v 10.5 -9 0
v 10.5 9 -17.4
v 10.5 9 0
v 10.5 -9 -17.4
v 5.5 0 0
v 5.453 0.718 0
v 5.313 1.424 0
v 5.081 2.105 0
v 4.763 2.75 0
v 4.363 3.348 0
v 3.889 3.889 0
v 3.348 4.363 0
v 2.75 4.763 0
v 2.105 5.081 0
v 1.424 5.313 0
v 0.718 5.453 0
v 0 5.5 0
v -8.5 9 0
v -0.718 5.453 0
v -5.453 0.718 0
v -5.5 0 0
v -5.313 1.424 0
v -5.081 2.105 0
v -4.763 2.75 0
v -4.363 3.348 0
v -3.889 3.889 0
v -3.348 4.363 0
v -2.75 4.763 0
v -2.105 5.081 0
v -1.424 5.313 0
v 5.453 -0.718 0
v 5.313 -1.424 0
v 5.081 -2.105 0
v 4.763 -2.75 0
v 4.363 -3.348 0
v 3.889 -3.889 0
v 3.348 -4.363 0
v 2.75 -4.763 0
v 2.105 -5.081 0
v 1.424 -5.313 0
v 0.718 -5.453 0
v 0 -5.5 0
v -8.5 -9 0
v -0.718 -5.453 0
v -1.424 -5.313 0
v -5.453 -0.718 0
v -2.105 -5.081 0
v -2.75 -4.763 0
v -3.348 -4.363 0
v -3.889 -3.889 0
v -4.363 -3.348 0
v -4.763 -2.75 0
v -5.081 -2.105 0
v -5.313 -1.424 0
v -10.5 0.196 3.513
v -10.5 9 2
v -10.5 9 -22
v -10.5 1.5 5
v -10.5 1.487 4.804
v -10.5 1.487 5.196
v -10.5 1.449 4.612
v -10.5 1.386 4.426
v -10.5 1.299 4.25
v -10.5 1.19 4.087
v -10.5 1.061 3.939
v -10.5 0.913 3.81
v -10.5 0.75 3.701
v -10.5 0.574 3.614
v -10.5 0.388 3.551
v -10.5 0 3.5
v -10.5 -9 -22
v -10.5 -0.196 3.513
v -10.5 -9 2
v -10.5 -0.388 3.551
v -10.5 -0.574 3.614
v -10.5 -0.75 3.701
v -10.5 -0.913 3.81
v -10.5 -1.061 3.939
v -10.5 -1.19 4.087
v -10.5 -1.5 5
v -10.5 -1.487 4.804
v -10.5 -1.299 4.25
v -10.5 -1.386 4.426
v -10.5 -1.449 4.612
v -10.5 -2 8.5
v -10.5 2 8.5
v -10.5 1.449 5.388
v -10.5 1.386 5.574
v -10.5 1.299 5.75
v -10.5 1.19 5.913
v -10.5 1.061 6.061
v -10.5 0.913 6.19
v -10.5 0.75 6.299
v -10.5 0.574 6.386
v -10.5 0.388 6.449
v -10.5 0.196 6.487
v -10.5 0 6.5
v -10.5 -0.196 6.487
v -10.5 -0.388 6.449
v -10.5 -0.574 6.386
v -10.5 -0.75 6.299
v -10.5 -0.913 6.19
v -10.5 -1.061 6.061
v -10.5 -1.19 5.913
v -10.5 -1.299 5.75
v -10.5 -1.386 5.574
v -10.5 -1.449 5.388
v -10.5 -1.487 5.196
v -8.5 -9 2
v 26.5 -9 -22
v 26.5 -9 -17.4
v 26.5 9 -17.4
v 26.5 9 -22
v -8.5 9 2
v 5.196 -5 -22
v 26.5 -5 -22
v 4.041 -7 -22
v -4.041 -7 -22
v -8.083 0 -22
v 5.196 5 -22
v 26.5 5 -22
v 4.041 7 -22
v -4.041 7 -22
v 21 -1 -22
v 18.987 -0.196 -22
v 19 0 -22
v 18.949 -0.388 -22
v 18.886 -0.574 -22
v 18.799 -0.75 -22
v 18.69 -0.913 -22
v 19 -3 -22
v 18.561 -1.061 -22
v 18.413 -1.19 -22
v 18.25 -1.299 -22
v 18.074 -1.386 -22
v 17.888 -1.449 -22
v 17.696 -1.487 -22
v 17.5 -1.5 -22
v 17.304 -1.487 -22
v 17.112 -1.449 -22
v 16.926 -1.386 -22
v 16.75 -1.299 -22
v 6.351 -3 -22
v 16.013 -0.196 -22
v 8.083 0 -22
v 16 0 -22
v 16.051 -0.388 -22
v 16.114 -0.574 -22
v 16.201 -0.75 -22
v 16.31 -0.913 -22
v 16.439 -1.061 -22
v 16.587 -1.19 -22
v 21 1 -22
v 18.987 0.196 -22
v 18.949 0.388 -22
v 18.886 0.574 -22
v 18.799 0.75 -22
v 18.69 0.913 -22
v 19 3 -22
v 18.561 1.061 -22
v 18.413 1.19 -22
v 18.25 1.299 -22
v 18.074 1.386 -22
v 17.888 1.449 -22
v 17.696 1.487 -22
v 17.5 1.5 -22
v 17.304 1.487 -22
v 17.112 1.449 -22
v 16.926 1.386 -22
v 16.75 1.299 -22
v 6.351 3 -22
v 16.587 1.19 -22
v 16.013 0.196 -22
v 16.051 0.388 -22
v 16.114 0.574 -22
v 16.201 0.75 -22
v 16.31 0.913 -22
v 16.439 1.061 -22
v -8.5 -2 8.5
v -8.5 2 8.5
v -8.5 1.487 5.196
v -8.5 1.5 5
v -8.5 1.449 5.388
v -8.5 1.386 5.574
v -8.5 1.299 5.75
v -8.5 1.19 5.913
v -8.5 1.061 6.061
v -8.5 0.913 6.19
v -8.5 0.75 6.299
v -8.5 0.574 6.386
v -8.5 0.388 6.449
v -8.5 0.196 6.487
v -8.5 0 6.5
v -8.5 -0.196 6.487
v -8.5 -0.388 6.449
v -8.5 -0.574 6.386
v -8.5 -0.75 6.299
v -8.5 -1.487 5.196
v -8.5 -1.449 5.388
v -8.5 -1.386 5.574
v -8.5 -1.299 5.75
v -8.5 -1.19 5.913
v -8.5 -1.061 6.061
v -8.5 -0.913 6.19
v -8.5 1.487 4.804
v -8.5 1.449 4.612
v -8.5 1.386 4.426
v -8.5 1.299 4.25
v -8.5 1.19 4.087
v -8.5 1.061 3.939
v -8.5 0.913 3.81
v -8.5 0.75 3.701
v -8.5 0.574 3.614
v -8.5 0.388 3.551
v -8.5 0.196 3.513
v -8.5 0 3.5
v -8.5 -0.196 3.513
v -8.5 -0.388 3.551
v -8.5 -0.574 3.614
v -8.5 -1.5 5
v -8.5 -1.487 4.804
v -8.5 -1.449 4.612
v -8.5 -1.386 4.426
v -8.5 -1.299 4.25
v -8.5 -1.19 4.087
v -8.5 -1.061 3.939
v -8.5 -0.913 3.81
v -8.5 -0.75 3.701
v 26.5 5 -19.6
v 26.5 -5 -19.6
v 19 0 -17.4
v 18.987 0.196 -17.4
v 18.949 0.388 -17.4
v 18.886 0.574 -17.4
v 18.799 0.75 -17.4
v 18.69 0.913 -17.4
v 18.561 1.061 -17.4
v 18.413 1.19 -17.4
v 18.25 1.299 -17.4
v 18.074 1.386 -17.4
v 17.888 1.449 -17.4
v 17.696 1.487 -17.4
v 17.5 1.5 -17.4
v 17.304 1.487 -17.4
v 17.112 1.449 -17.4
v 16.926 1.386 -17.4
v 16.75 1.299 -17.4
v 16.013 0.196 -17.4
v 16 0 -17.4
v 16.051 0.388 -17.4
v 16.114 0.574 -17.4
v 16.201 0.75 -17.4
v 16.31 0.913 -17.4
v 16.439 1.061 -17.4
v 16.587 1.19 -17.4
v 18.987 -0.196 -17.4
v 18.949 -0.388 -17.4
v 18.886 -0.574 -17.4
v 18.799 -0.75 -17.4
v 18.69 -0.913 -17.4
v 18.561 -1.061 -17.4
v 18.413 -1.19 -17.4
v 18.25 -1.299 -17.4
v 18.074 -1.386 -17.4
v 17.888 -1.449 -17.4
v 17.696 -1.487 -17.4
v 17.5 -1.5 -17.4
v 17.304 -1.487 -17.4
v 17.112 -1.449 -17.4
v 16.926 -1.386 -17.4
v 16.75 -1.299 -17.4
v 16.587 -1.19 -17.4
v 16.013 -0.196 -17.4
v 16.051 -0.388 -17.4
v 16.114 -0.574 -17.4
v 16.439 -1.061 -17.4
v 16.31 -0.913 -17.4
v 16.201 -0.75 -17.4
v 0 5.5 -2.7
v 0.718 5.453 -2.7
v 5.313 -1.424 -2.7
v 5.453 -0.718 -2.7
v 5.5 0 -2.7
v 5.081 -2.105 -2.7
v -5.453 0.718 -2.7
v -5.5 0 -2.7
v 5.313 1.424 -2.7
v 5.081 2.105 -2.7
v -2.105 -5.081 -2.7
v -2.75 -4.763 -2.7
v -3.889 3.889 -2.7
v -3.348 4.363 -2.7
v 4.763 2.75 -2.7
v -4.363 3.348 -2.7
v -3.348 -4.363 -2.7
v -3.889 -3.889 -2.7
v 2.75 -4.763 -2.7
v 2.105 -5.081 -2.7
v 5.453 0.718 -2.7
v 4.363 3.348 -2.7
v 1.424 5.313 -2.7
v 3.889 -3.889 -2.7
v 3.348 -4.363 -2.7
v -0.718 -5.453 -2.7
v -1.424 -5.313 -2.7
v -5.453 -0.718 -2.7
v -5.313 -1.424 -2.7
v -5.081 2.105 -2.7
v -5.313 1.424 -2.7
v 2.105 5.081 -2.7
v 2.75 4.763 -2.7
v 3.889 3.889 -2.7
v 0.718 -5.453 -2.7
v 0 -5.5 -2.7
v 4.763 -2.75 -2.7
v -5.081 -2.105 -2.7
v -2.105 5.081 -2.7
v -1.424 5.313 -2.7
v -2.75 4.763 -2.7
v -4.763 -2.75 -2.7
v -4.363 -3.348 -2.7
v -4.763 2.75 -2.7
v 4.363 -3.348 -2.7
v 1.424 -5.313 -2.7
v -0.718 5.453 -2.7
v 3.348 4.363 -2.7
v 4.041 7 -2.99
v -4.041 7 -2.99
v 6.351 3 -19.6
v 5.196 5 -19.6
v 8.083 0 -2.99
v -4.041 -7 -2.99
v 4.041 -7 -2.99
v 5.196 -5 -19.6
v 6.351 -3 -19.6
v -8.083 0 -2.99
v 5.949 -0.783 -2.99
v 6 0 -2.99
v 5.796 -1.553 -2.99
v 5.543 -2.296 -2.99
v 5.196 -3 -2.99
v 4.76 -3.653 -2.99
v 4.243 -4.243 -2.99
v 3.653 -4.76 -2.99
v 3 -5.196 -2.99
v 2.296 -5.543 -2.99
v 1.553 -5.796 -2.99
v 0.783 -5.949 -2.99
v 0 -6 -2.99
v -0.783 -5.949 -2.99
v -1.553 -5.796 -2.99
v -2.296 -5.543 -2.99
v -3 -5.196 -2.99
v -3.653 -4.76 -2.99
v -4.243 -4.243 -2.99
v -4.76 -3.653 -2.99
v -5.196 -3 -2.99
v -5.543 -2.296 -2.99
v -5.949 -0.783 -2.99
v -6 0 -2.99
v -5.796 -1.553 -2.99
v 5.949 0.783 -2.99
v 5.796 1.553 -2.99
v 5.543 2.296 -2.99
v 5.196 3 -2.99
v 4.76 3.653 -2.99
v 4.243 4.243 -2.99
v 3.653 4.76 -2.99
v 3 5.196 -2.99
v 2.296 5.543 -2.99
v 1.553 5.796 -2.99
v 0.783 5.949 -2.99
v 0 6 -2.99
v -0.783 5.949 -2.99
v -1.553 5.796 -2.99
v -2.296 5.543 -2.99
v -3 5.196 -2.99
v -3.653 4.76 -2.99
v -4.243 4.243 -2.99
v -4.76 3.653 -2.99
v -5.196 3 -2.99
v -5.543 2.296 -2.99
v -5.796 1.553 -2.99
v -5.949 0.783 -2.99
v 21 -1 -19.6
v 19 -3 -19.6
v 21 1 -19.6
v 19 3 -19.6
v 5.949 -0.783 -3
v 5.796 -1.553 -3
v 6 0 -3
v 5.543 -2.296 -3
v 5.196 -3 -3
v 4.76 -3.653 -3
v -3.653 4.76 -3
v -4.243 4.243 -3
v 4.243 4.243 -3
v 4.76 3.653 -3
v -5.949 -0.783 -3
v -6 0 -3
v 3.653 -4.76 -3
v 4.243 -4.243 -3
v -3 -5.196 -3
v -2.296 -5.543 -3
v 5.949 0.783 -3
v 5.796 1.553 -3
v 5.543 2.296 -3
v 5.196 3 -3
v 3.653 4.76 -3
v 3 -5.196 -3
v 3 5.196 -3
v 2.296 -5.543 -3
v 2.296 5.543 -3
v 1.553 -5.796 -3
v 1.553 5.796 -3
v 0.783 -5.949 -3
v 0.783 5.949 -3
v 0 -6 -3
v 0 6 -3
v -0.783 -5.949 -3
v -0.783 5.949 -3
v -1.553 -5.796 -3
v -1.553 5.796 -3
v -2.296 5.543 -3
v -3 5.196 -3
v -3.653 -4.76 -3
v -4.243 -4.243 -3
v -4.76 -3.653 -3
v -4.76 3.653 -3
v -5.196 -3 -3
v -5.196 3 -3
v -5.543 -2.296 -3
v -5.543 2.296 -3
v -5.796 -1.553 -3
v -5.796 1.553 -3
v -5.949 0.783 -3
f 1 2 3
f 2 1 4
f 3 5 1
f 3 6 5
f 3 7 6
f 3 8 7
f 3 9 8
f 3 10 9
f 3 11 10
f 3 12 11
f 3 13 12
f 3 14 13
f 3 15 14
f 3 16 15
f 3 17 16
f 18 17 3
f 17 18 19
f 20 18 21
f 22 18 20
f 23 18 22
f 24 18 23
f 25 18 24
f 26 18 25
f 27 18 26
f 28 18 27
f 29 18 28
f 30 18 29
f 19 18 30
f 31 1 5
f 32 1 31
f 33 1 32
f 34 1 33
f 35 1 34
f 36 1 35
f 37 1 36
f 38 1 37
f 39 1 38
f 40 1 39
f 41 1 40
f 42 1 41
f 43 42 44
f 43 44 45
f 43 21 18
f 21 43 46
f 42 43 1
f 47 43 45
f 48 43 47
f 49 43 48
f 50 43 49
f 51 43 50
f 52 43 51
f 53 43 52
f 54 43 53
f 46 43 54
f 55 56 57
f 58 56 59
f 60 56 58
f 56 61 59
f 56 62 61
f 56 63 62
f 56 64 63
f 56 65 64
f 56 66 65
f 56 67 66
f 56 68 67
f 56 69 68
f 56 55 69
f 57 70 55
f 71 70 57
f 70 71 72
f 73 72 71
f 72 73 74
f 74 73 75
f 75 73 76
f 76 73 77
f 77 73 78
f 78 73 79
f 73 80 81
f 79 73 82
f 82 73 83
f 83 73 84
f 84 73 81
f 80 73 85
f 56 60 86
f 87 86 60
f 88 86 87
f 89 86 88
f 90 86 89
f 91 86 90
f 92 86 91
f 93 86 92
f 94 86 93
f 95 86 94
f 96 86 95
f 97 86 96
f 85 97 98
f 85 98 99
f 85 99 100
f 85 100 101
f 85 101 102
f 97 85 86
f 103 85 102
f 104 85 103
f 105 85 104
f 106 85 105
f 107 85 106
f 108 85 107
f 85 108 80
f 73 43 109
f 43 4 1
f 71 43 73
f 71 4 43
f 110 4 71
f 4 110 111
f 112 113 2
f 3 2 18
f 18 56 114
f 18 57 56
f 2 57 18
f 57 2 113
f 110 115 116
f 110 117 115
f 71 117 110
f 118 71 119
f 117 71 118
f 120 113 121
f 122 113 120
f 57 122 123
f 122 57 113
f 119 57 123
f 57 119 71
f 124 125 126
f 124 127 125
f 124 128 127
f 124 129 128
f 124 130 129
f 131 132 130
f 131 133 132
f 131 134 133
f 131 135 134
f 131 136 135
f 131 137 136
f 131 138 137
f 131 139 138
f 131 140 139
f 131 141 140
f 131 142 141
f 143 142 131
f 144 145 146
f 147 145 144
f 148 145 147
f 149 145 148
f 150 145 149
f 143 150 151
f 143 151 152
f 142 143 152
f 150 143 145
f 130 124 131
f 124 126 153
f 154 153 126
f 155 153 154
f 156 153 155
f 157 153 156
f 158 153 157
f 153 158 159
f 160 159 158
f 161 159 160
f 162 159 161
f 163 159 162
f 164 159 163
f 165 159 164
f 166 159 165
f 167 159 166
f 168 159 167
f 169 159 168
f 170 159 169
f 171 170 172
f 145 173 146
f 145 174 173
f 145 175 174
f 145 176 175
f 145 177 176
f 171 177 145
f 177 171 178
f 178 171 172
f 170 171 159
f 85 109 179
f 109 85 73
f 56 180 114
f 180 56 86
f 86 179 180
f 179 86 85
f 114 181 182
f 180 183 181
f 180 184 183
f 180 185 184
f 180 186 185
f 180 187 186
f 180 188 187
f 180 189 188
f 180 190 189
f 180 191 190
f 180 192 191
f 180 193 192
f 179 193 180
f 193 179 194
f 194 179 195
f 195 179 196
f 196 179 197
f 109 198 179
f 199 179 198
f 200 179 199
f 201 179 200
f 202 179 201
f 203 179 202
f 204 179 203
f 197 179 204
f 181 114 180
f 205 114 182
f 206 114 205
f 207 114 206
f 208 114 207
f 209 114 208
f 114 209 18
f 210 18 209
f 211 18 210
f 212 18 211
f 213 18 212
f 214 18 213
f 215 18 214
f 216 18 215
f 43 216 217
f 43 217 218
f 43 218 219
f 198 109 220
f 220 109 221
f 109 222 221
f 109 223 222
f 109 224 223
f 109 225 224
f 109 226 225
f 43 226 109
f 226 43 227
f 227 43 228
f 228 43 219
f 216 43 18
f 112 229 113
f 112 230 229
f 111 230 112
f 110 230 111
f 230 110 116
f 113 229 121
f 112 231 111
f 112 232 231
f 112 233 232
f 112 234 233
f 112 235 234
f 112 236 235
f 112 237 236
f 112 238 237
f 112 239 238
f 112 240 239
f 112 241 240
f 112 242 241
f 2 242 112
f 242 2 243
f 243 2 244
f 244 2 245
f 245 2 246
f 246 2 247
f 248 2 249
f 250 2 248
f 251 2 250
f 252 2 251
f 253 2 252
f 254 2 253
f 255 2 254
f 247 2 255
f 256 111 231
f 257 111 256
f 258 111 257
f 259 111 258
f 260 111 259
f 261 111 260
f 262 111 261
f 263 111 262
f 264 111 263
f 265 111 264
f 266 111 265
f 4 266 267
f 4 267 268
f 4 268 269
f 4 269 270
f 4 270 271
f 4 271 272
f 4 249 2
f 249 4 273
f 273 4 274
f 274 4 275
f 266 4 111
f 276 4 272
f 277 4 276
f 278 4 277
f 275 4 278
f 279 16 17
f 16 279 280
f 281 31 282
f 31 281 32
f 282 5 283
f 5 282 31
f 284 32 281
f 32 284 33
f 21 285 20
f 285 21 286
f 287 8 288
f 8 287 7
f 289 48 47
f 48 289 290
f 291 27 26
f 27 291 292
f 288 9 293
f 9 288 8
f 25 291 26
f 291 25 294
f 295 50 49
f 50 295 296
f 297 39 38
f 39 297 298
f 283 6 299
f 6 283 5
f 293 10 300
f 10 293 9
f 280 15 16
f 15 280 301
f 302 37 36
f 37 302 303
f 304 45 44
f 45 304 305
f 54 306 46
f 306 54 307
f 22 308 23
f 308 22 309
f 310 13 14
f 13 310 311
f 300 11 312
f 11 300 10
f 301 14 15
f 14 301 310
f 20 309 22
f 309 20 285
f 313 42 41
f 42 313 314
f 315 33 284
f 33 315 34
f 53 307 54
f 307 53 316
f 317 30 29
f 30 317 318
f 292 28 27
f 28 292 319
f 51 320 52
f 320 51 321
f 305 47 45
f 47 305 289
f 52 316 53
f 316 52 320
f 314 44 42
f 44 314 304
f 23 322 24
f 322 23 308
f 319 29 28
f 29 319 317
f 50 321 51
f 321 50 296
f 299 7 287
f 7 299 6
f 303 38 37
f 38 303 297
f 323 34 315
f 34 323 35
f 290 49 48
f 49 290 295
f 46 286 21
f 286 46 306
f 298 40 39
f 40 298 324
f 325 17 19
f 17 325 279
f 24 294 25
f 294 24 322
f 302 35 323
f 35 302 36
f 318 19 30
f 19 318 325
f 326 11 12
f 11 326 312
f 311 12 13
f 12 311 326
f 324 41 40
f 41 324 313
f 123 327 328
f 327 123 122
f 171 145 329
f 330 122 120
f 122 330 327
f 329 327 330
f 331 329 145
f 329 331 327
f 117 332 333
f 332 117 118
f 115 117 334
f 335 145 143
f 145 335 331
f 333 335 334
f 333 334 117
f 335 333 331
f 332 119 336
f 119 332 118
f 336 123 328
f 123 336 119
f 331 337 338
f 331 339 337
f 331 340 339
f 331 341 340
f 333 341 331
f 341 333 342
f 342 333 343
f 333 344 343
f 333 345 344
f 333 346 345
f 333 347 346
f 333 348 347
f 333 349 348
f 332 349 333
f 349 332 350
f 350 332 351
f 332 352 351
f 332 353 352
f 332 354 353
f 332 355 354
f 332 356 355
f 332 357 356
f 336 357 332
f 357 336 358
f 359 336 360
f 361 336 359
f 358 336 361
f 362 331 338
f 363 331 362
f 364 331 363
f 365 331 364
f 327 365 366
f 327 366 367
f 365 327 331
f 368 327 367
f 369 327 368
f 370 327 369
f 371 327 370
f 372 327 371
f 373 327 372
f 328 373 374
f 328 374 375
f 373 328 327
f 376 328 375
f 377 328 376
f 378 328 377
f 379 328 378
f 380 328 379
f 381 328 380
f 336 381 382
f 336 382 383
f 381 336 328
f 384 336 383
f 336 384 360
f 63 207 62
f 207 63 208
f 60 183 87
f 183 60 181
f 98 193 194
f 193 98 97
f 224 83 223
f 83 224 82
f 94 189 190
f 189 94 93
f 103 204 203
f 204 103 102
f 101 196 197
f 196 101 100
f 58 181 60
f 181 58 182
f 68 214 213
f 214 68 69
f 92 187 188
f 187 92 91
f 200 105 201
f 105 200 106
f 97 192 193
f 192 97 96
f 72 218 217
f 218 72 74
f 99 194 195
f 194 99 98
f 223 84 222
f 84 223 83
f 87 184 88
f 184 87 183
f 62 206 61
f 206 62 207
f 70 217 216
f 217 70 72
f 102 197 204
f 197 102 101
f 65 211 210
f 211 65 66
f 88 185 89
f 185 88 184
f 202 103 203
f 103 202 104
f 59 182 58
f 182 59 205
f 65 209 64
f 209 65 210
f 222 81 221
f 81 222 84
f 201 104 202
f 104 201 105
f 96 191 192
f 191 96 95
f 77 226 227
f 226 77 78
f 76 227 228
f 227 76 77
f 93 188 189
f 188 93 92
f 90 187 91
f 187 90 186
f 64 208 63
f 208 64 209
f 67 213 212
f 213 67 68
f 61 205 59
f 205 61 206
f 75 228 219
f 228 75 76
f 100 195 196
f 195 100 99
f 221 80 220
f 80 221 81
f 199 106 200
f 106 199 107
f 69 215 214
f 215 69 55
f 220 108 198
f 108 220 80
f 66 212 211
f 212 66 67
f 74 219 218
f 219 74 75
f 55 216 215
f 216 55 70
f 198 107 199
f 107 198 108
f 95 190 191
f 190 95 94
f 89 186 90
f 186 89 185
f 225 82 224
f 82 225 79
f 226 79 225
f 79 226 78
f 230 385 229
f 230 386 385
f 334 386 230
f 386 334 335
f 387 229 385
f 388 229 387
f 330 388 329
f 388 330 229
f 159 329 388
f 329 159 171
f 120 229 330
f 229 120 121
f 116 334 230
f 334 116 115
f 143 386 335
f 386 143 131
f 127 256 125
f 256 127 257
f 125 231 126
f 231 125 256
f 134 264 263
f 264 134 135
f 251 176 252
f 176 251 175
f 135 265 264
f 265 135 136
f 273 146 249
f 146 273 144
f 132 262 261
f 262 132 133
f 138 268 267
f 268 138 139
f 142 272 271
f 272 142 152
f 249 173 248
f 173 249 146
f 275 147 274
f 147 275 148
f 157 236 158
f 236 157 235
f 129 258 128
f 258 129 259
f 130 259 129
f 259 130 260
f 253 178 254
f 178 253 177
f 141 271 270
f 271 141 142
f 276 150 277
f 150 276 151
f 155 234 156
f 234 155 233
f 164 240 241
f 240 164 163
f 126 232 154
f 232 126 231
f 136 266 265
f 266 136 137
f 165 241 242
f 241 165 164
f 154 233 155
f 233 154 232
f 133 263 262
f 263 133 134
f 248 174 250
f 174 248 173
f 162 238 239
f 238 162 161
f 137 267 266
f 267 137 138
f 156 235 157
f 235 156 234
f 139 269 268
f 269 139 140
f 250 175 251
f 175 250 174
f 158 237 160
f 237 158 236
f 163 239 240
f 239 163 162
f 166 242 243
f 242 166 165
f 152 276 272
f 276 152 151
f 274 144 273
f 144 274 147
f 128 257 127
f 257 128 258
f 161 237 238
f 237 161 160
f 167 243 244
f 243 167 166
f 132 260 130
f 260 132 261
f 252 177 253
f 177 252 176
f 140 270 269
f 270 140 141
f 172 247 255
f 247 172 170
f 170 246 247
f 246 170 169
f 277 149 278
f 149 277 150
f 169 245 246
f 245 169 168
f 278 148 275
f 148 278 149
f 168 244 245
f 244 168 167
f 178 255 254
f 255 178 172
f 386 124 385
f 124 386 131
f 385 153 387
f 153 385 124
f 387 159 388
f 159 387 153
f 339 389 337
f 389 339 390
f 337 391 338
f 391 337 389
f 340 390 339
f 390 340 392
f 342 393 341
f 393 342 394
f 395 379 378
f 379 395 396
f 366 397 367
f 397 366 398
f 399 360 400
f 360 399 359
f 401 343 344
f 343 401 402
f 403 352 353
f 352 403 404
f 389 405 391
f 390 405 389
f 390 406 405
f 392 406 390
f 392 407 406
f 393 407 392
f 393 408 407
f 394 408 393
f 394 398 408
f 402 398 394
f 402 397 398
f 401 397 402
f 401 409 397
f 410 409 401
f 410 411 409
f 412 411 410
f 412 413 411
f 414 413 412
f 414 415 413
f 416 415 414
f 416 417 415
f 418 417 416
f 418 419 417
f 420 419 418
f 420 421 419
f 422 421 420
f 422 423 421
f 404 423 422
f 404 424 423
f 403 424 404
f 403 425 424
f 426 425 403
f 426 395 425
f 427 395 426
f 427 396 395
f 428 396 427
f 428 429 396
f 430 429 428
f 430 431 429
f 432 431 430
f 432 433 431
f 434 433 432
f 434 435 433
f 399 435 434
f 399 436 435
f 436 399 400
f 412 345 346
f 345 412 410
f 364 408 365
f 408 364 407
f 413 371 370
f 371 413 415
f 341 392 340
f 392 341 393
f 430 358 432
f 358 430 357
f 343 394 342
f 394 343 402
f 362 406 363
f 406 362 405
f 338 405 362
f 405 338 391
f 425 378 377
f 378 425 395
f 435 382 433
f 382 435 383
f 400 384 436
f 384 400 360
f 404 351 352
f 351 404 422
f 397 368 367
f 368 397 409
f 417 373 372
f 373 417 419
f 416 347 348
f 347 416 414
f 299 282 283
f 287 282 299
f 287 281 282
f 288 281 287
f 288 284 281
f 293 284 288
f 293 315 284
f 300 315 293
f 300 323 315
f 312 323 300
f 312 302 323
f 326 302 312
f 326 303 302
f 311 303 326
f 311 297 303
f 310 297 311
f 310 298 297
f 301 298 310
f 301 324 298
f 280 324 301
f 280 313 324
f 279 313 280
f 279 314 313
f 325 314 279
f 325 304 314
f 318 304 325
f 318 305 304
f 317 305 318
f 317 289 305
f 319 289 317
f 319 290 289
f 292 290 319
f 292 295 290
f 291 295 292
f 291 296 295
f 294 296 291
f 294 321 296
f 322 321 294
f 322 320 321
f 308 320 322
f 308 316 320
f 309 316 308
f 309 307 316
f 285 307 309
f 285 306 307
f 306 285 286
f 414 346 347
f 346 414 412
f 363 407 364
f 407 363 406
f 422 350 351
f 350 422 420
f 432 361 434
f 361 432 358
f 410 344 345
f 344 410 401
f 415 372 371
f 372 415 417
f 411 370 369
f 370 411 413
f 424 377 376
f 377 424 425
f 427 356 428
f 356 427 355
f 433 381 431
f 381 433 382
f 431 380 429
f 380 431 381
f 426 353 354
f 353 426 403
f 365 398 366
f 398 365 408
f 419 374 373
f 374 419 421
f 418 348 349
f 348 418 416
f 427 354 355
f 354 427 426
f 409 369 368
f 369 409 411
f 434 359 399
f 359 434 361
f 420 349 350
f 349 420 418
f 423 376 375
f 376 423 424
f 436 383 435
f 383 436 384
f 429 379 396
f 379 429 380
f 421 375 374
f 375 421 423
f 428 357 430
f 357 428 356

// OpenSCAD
*color("#777") conn12v();
*color("#999") translate([0,0,5]) connnut();

rotate([180,0,0]) connbox();

module conn12v()
{
    difference() {
        union() {
            translate([0,0,-2]) cylinder(2, 12.5/2, 12.5/2, $fn=32);
            translate([0,0,0]) cylinder(15, 10.6/2, 10.6/2, $fn=48);
            translate([0,0,15]) cylinder(5, 2.5/2, 2.5/2, $fn=48);
            translate([4,-3.1/2,15]) cube([0.3, 3.1, 11]);
        }
        translate([0,0,-2.01]) cylinder(8.01, 5.5/2, 5.5/2, $fn=48);
    }
}

module connnut()
{
    linear_extrude(height=2.4, convexity=5) difference() {
        circle(14/sqrt(3), $fn=6);
        circle((11/2), $fn=48);
    }
}

module connbox()
{
    bw = 18;
    bl = 21;
    bx = 10.5;
    bh = 3;
    difference() {
        union() {
            translate([-bx, -bw/2, 0]) cube([bl, bw, bh]);
            translate([-bx, -bw/2, 0]) cube([bl, 2, 22]);
            translate([-bx, bw/2-2, 0]) cube([bl, 2, 22]);
            *translate([-bx, -bw/2, 0]) cube([2, bw, 22]);
            *translate([bl-bx-2, -bw/2, 0]) cube([2, bw, 20]);
            translate([-bx, -bw/2, 0]) cube([7, bw, 22]);
            translate([-bx, -bw/2, 0]) cube([bx*2, bw, 22]);
            translate([-bx,0,0]) rotate([0,90,0]) linear_extrude(height=2, convexity=4) {
                polygon([
                    [0,-bw/2],[2,-bw/2],[4+bw/4,-2],
                    [4+bw/4,2],[2,bw/2],[0,bw/2]
                ]);
            }
            translate([bl-bx-2, -bw/2, 22-4.6]) cube([18, bw, 4.6]);
        }
        translate([0,0,-0.01]) cylinder(bh+0.02, 11/2, 11/2, $fn=48);
        translate([0,0,bh-0.01]) cylinder(22-bh+0.02, 14/sqrt(3), 14/sqrt(3), $fn=6);
        translate([-bx-0.01,0,-5]) rotate([0,90,0]) cylinder(2.02, 1.5, 1.5, $fn=48);
        translate([bl-bx-5.5, -3-2, 22-2.4]) cube([17, 2, 2.41]);
        translate([bl-bx-5.5, +3, 22-2.4]) cube([17, 2, 2.41]);
        *translate([bl-bx+11, -5, 22-2.4]) cube([5.01, 10, 2.41]);
        translate([bl-bx+7, 0, 22-4.61]) cylinder(4.62, 1.5, 1.5, $fn=48);
        #translate([bl-bx+11, 0, 22-2.4]) linear_extrude(height=2.41, convexity=5) polygon([
            [5.01,-5], [5.01,5], [-4.5,5], [-0.5,1], [-0.5,-1], [-4.5,-5]
        ]);
    }
    #translate([0, 0, 3-0.3]) cylinder(0.3, 6, 6, $fn=48);
}
